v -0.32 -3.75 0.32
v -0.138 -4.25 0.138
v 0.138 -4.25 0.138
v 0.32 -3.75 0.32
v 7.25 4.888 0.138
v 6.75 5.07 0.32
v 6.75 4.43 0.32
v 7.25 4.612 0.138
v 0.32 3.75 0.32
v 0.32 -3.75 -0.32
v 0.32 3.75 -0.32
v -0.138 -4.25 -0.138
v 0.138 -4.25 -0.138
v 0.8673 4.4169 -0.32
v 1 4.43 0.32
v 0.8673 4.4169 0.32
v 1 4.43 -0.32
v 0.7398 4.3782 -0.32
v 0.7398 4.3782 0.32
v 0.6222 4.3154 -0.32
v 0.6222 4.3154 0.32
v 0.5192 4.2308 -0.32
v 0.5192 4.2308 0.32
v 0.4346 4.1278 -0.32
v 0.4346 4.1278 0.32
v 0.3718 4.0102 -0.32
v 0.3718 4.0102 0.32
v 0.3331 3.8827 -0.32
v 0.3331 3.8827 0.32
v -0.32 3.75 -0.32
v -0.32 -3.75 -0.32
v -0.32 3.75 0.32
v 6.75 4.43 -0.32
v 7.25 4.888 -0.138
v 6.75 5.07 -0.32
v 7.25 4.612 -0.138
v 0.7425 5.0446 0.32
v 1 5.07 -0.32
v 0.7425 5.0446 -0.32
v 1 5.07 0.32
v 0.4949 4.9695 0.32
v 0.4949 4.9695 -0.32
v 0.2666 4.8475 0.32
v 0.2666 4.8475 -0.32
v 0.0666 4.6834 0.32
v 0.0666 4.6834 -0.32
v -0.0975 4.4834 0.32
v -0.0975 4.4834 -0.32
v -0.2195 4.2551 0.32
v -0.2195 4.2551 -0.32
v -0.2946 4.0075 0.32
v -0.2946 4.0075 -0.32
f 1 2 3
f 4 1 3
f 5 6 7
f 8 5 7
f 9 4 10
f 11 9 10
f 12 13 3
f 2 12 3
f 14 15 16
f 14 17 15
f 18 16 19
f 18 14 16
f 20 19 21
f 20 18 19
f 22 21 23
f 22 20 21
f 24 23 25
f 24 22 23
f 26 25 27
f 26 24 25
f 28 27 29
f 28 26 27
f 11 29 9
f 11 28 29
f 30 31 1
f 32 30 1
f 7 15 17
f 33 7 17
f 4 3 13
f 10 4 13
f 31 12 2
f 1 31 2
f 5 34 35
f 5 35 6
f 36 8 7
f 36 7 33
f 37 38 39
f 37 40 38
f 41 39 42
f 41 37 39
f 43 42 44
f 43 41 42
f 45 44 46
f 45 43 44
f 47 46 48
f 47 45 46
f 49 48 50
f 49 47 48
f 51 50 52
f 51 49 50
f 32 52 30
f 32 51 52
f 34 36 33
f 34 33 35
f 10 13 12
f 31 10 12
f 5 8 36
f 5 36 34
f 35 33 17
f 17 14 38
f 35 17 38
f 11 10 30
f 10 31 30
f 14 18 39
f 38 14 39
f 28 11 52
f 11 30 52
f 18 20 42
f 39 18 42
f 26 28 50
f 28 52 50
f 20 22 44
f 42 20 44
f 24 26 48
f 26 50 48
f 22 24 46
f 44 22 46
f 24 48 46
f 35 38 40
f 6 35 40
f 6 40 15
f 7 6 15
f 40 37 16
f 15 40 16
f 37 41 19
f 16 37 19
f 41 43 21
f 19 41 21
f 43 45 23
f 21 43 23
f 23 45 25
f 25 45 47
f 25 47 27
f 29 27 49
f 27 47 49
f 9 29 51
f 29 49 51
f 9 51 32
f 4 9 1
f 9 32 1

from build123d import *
from OCP.BRepFilletAPI import BRepFilletAPI_MakeChamfer

# Parameters (mm, degrees)
SKETCH_1_W      = 0.64
SKETCH_1_H      = 0.64
CHAMFER_1_SIZE  = 0.5
CHAMFER_1_SIZE2 = 0.181985117
CHAMFER_2_SIZE  = 0.5
CHAMFER_2_SIZE2 = 0.181985117


with BuildPart() as part:
    # По траектории1: sweep along a path in Эскиз2
    with BuildLine(Plane.XY) as sweep_1_path:
        Line((7.25, 4.75), (1, 4.75))
        ThreePointArc((1, 4.75), (0.292893219, 4.457106781), (0, 3.75))
        Line((0, 3.75), (0, 0))
        Line((0, 0), (0, -4.25))
    # Эскиз1 → По траектории1 (sweep)
    with BuildSketch(Plane(origin=(0, 0, 0), x_dir=(1, 0, 0), z_dir=(0, 1, 0))):
        Rectangle(SKETCH_1_W, SKETCH_1_H)
    sweep(path=sweep_1_path.line)

    # Фаска1: one chamfer whose edges measure the first distance from different faces: ONE call of the kernel's chamfer builder (chamfer() names one face for all edges)
    chamfer_1_edges_1 = [part.edges().sort_by_distance(p)[0] for p in [
        (7.25, 5.07, 0),
    ]]
    chamfer_1_side_1 = [part.faces().sort_by_distance(p)[0] for p in [
        (4.125, 5.07, 0),
    ]]
    chamfer_1_edges_2 = [part.edges().sort_by_distance(p)[0] for p in [
        (7.25, 4.75, 0.32),
    ]]
    chamfer_1_side_2 = [part.faces().sort_by_distance(p)[0] for p in [
        (4.125, 4.949930312, 0.32),
    ]]
    chamfer_1_edges_3 = [part.edges().sort_by_distance(p)[0] for p in [
        (7.25, 4.43, 0),
    ]]
    chamfer_1_side_3 = [part.faces().sort_by_distance(p)[0] for p in [
        (4.125, 4.43, 0),
    ]]
    chamfer_1_edges_4 = [part.edges().sort_by_distance(p)[0] for p in [
        (7.25, 4.75, -0.32),
    ]]
    chamfer_1_side_4 = [part.faces().sort_by_distance(p)[0] for p in [
        (4.125, 4.550069688, -0.32),
    ]]
    chamfer_1 = BRepFilletAPI_MakeChamfer(part.part.solid().wrapped)
    for e in chamfer_1_edges_1:
        chamfer_1.Add(CHAMFER_1_SIZE, CHAMFER_1_SIZE2, e.wrapped, chamfer_1_side_1[0].wrapped)  # the first distance lies on this face
    for e in chamfer_1_edges_2:
        chamfer_1.Add(CHAMFER_1_SIZE, CHAMFER_1_SIZE2, e.wrapped, chamfer_1_side_2[0].wrapped)  # the first distance lies on this face
    for e in chamfer_1_edges_3:
        chamfer_1.Add(CHAMFER_1_SIZE, CHAMFER_1_SIZE2, e.wrapped, chamfer_1_side_3[0].wrapped)  # the first distance lies on this face
    for e in chamfer_1_edges_4:
        chamfer_1.Add(CHAMFER_1_SIZE, CHAMFER_1_SIZE2, e.wrapped, chamfer_1_side_4[0].wrapped)  # the first distance lies on this face
    add(Compound.cast(chamfer_1.Shape()), mode=Mode.REPLACE)

    # Фаска2: one chamfer whose edges measure the first distance from different faces: ONE call of the kernel's chamfer builder (chamfer() names one face for all edges)
    chamfer_2_edges_1 = [part.edges().sort_by_distance(p)[0] for p in [
        (0, -4.25, 0.32),
    ]]
    chamfer_2_side_1 = [part.faces().sort_by_distance(p)[0] for p in [
        (3.875, 4.953018249, 0.32),
    ]]
    chamfer_2_edges_2 = [part.edges().sort_by_distance(p)[0] for p in [
        (0.32, -4.25, 0),
    ]]
    chamfer_2_side_2 = [part.faces().sort_by_distance(p)[0] for p in [
        (0.32, -0.25, 0),
    ]]
    chamfer_2_edges_3 = [part.edges().sort_by_distance(p)[0] for p in [
        (0, -4.25, -0.32),
    ]]
    chamfer_2_side_3 = [part.faces().sort_by_distance(p)[0] for p in [
        (3.875, 4.546981751, -0.32),
    ]]
    chamfer_2_edges_4 = [part.edges().sort_by_distance(p)[0] for p in [
        (-0.32, -4.25, 0),
    ]]
    chamfer_2_side_4 = [part.faces().sort_by_distance(p)[0] for p in [
        (-0.32, -0.25, 0),
    ]]
    chamfer_2 = BRepFilletAPI_MakeChamfer(part.part.solid().wrapped)
    for e in chamfer_2_edges_1:
        chamfer_2.Add(CHAMFER_2_SIZE, CHAMFER_2_SIZE2, e.wrapped, chamfer_2_side_1[0].wrapped)  # the first distance lies on this face
    for e in chamfer_2_edges_2:
        chamfer_2.Add(CHAMFER_2_SIZE, CHAMFER_2_SIZE2, e.wrapped, chamfer_2_side_2[0].wrapped)  # the first distance lies on this face
    for e in chamfer_2_edges_3:
        chamfer_2.Add(CHAMFER_2_SIZE, CHAMFER_2_SIZE2, e.wrapped, chamfer_2_side_3[0].wrapped)  # the first distance lies on this face
    for e in chamfer_2_edges_4:
        chamfer_2.Add(CHAMFER_2_SIZE, CHAMFER_2_SIZE2, e.wrapped, chamfer_2_side_4[0].wrapped)  # the first distance lies on this face
    add(Compound.cast(chamfer_2.Shape()), mode=Mode.REPLACE)


solid = part.part
